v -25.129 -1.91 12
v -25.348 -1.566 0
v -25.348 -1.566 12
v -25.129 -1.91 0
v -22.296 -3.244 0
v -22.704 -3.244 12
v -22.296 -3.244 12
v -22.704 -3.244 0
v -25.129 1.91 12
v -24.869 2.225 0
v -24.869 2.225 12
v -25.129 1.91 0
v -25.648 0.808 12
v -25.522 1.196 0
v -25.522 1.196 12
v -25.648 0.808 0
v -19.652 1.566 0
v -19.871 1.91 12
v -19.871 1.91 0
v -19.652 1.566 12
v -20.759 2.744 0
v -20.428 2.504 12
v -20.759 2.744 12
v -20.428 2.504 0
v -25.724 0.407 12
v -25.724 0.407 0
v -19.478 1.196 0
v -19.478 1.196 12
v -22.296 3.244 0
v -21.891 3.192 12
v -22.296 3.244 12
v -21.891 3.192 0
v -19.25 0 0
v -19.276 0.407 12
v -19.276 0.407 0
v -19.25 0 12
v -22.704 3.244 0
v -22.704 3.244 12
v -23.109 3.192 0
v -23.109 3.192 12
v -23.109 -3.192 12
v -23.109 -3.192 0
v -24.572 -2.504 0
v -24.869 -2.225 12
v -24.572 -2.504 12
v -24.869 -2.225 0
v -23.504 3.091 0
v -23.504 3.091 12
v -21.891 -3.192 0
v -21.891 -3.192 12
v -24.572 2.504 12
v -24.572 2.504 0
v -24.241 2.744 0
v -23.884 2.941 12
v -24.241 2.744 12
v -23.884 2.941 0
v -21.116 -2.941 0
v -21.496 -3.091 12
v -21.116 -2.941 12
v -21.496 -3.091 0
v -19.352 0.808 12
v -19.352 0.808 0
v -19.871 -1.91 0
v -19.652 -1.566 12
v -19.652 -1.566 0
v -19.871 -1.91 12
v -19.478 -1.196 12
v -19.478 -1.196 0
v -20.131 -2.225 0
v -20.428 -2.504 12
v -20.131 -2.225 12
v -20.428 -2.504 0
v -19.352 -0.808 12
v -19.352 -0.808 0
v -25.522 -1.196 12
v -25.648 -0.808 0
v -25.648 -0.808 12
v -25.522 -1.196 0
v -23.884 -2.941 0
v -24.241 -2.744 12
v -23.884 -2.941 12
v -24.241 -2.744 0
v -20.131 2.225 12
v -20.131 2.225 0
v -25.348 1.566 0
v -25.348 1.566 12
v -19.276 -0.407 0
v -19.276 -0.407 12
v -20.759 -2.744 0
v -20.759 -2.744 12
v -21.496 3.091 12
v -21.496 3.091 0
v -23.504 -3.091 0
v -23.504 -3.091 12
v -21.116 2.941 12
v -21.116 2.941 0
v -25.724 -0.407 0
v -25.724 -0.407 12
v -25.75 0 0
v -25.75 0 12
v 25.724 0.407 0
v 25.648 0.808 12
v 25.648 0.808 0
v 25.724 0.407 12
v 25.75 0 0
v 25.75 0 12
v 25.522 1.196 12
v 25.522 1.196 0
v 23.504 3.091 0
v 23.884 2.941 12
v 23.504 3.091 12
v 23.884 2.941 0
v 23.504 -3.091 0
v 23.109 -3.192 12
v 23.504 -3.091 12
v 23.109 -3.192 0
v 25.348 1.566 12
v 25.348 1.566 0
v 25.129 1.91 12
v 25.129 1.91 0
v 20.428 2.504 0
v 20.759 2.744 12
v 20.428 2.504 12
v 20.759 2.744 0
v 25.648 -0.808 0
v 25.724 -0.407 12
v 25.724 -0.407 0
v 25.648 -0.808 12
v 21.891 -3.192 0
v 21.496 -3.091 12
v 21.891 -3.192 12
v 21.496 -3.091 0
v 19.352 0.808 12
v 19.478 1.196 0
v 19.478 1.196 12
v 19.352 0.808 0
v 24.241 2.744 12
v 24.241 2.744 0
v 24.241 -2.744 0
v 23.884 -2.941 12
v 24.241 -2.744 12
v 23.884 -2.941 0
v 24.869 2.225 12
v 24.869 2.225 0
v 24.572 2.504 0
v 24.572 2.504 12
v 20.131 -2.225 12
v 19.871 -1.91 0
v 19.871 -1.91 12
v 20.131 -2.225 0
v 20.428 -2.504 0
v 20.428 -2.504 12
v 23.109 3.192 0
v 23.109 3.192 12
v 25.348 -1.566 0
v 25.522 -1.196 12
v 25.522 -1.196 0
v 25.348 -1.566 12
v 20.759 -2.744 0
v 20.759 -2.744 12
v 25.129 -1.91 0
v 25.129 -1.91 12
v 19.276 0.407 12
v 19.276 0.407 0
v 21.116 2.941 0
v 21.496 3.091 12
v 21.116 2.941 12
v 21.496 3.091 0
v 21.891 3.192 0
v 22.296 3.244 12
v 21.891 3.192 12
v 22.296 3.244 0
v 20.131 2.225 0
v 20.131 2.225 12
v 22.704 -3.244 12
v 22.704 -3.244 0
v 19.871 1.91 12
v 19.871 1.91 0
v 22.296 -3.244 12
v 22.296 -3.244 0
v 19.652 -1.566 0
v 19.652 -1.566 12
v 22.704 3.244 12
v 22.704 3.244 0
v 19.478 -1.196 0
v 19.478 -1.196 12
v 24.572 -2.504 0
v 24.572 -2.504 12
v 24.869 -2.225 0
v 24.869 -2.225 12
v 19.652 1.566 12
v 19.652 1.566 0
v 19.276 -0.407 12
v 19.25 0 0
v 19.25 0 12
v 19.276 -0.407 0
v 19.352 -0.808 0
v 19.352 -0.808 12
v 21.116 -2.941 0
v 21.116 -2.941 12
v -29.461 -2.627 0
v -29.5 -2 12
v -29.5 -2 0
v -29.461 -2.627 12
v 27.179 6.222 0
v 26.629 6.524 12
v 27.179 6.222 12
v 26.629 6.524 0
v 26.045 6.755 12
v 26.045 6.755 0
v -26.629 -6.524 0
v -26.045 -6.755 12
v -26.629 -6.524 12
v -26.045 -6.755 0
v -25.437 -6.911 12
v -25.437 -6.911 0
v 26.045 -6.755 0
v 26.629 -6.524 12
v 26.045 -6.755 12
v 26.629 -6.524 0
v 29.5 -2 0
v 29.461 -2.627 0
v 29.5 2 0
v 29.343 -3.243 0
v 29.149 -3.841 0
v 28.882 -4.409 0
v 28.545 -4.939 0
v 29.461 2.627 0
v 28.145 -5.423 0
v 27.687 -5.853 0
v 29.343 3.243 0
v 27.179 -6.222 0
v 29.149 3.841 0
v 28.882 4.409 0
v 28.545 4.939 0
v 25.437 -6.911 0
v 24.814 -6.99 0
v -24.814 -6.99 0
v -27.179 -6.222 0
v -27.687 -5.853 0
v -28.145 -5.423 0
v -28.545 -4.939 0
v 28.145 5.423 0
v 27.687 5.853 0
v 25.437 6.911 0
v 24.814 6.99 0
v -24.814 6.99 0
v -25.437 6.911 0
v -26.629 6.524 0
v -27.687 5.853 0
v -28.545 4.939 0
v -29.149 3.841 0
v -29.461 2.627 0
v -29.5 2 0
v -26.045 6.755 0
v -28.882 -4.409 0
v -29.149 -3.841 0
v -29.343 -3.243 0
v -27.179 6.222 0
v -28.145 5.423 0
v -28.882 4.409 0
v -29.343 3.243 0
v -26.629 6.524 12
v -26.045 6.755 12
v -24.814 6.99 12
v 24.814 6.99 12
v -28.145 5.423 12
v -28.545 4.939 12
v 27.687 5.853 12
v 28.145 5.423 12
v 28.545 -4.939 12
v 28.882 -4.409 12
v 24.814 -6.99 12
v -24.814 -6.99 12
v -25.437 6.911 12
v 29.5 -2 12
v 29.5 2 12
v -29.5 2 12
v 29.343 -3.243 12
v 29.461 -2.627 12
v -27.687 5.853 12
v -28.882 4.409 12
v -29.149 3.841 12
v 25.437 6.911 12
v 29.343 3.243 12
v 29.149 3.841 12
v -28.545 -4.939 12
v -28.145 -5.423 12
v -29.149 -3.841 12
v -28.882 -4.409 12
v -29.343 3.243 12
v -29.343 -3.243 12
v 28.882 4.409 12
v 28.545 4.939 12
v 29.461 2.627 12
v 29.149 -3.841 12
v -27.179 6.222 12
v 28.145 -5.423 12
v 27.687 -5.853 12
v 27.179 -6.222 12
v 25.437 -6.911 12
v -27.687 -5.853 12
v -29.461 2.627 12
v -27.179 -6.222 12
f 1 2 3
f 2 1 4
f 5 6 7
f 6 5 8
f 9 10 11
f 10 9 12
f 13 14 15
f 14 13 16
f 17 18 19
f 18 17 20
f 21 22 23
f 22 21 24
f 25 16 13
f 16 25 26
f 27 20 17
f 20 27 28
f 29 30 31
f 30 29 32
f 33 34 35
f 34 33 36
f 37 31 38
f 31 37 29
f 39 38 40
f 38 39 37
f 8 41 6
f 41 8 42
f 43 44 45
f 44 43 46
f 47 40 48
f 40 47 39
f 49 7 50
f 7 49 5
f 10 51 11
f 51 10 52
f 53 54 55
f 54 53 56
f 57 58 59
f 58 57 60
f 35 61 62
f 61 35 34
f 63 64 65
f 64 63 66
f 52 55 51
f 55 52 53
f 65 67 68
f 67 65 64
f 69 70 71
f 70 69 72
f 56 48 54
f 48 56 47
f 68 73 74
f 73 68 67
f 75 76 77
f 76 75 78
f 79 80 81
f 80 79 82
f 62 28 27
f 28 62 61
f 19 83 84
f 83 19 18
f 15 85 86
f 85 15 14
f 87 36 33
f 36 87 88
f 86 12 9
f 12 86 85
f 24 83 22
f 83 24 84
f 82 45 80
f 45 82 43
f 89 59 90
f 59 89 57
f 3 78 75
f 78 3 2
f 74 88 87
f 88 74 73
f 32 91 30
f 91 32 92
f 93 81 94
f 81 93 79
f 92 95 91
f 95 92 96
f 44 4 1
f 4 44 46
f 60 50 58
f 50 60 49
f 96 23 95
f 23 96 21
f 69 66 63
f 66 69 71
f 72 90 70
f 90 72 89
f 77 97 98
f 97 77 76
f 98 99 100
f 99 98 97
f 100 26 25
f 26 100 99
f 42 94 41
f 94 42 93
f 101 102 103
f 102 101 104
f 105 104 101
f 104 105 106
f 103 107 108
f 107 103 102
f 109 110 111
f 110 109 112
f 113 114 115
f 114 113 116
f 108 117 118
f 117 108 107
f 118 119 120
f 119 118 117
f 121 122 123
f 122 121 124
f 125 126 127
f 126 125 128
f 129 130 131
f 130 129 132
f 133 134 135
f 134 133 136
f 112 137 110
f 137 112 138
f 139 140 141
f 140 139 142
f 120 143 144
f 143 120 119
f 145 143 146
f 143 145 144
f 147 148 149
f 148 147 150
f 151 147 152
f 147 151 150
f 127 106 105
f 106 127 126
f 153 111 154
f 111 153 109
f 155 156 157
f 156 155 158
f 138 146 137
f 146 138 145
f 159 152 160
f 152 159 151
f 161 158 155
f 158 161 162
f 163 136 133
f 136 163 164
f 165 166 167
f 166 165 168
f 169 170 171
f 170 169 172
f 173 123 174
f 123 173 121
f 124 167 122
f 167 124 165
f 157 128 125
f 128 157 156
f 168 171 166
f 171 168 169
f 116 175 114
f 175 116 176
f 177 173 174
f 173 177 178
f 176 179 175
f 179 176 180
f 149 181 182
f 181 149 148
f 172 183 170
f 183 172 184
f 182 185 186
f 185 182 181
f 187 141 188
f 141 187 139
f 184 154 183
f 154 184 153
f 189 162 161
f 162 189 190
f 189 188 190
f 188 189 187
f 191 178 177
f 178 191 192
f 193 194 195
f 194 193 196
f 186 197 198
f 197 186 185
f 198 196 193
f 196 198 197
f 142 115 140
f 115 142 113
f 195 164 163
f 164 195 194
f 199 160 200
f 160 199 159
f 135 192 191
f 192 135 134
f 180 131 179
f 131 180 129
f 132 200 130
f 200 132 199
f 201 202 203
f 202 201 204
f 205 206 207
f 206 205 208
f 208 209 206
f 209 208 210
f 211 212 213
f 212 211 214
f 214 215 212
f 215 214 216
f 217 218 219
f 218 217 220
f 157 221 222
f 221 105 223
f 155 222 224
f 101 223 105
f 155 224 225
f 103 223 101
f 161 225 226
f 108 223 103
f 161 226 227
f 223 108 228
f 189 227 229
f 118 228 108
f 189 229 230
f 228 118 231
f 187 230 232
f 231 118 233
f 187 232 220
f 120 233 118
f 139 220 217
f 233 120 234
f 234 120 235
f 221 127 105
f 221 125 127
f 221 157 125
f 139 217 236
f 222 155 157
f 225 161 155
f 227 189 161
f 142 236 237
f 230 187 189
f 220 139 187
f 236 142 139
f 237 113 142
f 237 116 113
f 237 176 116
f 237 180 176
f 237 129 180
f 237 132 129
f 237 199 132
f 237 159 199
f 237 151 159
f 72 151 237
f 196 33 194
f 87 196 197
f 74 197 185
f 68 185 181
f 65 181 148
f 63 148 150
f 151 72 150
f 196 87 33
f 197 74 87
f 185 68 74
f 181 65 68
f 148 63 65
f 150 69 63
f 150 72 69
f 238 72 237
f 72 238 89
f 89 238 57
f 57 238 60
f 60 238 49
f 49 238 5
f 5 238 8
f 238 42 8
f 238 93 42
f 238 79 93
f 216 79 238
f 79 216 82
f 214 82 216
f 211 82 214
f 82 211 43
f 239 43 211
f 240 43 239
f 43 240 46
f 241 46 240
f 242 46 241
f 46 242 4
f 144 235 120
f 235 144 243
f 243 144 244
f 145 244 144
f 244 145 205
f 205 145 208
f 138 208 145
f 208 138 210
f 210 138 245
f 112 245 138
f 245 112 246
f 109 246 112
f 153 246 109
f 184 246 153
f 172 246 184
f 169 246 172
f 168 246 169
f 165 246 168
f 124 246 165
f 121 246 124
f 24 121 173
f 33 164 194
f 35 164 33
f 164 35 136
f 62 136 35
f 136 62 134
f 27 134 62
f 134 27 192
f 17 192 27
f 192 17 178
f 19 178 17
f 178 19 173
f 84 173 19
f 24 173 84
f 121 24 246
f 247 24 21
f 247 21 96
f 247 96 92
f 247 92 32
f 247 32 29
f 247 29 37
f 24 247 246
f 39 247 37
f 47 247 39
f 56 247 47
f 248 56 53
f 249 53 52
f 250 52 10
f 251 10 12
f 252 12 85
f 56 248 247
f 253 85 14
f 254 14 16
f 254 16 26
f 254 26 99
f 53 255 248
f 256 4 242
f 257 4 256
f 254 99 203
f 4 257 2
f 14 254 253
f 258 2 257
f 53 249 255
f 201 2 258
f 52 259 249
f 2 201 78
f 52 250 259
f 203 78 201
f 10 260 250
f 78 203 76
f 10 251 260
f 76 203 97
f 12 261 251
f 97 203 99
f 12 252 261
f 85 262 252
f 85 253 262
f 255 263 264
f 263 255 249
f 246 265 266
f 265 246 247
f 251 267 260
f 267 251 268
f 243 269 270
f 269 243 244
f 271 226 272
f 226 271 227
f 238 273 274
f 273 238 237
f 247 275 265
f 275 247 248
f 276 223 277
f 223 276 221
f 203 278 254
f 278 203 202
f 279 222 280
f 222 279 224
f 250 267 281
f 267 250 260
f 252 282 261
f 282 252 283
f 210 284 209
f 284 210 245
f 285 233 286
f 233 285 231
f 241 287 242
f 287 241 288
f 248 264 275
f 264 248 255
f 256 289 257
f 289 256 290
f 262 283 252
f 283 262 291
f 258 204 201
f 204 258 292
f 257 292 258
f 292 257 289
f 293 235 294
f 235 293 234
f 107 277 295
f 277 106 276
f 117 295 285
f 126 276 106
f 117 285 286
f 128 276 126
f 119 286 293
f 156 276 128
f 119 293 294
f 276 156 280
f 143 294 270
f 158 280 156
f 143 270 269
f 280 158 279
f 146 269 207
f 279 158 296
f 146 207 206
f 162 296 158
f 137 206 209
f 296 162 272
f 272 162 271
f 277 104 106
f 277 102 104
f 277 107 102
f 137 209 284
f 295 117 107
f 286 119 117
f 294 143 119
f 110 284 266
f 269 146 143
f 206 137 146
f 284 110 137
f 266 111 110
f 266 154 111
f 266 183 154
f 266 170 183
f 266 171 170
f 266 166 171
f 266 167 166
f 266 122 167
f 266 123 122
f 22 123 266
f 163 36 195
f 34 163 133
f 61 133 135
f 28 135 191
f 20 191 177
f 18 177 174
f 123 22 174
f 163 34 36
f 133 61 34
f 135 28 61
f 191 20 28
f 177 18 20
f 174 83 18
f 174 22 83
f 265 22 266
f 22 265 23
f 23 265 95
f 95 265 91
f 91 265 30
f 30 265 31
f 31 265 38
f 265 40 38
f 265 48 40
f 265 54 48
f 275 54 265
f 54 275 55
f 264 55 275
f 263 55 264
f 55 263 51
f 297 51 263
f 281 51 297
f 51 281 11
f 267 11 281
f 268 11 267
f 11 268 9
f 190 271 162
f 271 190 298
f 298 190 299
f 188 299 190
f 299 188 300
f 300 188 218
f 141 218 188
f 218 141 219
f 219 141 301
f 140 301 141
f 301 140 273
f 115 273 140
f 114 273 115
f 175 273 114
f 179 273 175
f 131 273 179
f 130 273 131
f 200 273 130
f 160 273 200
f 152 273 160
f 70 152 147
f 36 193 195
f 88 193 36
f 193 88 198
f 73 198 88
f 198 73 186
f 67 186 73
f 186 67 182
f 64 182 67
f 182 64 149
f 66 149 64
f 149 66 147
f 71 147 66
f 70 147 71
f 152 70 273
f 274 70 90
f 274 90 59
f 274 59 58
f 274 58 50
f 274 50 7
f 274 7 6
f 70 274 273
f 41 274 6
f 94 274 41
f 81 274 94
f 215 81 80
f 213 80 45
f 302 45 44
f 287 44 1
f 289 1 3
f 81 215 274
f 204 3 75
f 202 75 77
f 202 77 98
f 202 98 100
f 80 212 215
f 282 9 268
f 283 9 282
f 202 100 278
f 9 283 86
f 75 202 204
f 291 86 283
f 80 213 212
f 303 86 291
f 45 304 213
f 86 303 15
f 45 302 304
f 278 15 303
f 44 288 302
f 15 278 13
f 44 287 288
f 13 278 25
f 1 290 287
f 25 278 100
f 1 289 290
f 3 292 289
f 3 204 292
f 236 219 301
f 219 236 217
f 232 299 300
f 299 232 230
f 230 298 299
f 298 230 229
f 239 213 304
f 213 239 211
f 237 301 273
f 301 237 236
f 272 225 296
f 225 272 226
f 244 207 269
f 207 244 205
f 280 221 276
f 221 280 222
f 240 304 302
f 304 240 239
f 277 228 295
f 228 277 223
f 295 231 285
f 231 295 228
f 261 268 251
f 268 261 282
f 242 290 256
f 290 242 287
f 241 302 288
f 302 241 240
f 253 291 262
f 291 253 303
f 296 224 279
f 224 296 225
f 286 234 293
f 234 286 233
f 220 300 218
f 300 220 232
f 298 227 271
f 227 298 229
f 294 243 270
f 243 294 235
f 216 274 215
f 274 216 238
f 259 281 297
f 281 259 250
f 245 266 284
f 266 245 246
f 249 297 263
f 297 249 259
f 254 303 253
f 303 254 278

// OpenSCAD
$fn = 50;


difference() {
	union() {
		hull() {
			translate(v = [-24.5000000000, 2.0000000000, 0]) {
				cylinder(h = 12, r = 5);
			}
			translate(v = [24.5000000000, 2.0000000000, 0]) {
				cylinder(h = 12, r = 5);
			}
			translate(v = [-24.5000000000, -2.0000000000, 0]) {
				cylinder(h = 12, r = 5);
			}
			translate(v = [24.5000000000, -2.0000000000, 0]) {
				cylinder(h = 12, r = 5);
			}
		}
	}
	union() {
		translate(v = [-22.5000000000, 0.0000000000, -100.0000000000]) {
			cylinder(h = 200, r = 3.2500000000);
		}
		translate(v = [-22.5000000000, 0.0000000000, -100.0000000000]) {
			cylinder(h = 200, r = 3.2500000000);
		}
		translate(v = [22.5000000000, 0.0000000000, -100.0000000000]) {
			cylinder(h = 200, r = 3.2500000000);
		}
		translate(v = [22.5000000000, 0.0000000000, -100.0000000000]) {
			cylinder(h = 200, r = 3.2500000000);
		}
	}
}
